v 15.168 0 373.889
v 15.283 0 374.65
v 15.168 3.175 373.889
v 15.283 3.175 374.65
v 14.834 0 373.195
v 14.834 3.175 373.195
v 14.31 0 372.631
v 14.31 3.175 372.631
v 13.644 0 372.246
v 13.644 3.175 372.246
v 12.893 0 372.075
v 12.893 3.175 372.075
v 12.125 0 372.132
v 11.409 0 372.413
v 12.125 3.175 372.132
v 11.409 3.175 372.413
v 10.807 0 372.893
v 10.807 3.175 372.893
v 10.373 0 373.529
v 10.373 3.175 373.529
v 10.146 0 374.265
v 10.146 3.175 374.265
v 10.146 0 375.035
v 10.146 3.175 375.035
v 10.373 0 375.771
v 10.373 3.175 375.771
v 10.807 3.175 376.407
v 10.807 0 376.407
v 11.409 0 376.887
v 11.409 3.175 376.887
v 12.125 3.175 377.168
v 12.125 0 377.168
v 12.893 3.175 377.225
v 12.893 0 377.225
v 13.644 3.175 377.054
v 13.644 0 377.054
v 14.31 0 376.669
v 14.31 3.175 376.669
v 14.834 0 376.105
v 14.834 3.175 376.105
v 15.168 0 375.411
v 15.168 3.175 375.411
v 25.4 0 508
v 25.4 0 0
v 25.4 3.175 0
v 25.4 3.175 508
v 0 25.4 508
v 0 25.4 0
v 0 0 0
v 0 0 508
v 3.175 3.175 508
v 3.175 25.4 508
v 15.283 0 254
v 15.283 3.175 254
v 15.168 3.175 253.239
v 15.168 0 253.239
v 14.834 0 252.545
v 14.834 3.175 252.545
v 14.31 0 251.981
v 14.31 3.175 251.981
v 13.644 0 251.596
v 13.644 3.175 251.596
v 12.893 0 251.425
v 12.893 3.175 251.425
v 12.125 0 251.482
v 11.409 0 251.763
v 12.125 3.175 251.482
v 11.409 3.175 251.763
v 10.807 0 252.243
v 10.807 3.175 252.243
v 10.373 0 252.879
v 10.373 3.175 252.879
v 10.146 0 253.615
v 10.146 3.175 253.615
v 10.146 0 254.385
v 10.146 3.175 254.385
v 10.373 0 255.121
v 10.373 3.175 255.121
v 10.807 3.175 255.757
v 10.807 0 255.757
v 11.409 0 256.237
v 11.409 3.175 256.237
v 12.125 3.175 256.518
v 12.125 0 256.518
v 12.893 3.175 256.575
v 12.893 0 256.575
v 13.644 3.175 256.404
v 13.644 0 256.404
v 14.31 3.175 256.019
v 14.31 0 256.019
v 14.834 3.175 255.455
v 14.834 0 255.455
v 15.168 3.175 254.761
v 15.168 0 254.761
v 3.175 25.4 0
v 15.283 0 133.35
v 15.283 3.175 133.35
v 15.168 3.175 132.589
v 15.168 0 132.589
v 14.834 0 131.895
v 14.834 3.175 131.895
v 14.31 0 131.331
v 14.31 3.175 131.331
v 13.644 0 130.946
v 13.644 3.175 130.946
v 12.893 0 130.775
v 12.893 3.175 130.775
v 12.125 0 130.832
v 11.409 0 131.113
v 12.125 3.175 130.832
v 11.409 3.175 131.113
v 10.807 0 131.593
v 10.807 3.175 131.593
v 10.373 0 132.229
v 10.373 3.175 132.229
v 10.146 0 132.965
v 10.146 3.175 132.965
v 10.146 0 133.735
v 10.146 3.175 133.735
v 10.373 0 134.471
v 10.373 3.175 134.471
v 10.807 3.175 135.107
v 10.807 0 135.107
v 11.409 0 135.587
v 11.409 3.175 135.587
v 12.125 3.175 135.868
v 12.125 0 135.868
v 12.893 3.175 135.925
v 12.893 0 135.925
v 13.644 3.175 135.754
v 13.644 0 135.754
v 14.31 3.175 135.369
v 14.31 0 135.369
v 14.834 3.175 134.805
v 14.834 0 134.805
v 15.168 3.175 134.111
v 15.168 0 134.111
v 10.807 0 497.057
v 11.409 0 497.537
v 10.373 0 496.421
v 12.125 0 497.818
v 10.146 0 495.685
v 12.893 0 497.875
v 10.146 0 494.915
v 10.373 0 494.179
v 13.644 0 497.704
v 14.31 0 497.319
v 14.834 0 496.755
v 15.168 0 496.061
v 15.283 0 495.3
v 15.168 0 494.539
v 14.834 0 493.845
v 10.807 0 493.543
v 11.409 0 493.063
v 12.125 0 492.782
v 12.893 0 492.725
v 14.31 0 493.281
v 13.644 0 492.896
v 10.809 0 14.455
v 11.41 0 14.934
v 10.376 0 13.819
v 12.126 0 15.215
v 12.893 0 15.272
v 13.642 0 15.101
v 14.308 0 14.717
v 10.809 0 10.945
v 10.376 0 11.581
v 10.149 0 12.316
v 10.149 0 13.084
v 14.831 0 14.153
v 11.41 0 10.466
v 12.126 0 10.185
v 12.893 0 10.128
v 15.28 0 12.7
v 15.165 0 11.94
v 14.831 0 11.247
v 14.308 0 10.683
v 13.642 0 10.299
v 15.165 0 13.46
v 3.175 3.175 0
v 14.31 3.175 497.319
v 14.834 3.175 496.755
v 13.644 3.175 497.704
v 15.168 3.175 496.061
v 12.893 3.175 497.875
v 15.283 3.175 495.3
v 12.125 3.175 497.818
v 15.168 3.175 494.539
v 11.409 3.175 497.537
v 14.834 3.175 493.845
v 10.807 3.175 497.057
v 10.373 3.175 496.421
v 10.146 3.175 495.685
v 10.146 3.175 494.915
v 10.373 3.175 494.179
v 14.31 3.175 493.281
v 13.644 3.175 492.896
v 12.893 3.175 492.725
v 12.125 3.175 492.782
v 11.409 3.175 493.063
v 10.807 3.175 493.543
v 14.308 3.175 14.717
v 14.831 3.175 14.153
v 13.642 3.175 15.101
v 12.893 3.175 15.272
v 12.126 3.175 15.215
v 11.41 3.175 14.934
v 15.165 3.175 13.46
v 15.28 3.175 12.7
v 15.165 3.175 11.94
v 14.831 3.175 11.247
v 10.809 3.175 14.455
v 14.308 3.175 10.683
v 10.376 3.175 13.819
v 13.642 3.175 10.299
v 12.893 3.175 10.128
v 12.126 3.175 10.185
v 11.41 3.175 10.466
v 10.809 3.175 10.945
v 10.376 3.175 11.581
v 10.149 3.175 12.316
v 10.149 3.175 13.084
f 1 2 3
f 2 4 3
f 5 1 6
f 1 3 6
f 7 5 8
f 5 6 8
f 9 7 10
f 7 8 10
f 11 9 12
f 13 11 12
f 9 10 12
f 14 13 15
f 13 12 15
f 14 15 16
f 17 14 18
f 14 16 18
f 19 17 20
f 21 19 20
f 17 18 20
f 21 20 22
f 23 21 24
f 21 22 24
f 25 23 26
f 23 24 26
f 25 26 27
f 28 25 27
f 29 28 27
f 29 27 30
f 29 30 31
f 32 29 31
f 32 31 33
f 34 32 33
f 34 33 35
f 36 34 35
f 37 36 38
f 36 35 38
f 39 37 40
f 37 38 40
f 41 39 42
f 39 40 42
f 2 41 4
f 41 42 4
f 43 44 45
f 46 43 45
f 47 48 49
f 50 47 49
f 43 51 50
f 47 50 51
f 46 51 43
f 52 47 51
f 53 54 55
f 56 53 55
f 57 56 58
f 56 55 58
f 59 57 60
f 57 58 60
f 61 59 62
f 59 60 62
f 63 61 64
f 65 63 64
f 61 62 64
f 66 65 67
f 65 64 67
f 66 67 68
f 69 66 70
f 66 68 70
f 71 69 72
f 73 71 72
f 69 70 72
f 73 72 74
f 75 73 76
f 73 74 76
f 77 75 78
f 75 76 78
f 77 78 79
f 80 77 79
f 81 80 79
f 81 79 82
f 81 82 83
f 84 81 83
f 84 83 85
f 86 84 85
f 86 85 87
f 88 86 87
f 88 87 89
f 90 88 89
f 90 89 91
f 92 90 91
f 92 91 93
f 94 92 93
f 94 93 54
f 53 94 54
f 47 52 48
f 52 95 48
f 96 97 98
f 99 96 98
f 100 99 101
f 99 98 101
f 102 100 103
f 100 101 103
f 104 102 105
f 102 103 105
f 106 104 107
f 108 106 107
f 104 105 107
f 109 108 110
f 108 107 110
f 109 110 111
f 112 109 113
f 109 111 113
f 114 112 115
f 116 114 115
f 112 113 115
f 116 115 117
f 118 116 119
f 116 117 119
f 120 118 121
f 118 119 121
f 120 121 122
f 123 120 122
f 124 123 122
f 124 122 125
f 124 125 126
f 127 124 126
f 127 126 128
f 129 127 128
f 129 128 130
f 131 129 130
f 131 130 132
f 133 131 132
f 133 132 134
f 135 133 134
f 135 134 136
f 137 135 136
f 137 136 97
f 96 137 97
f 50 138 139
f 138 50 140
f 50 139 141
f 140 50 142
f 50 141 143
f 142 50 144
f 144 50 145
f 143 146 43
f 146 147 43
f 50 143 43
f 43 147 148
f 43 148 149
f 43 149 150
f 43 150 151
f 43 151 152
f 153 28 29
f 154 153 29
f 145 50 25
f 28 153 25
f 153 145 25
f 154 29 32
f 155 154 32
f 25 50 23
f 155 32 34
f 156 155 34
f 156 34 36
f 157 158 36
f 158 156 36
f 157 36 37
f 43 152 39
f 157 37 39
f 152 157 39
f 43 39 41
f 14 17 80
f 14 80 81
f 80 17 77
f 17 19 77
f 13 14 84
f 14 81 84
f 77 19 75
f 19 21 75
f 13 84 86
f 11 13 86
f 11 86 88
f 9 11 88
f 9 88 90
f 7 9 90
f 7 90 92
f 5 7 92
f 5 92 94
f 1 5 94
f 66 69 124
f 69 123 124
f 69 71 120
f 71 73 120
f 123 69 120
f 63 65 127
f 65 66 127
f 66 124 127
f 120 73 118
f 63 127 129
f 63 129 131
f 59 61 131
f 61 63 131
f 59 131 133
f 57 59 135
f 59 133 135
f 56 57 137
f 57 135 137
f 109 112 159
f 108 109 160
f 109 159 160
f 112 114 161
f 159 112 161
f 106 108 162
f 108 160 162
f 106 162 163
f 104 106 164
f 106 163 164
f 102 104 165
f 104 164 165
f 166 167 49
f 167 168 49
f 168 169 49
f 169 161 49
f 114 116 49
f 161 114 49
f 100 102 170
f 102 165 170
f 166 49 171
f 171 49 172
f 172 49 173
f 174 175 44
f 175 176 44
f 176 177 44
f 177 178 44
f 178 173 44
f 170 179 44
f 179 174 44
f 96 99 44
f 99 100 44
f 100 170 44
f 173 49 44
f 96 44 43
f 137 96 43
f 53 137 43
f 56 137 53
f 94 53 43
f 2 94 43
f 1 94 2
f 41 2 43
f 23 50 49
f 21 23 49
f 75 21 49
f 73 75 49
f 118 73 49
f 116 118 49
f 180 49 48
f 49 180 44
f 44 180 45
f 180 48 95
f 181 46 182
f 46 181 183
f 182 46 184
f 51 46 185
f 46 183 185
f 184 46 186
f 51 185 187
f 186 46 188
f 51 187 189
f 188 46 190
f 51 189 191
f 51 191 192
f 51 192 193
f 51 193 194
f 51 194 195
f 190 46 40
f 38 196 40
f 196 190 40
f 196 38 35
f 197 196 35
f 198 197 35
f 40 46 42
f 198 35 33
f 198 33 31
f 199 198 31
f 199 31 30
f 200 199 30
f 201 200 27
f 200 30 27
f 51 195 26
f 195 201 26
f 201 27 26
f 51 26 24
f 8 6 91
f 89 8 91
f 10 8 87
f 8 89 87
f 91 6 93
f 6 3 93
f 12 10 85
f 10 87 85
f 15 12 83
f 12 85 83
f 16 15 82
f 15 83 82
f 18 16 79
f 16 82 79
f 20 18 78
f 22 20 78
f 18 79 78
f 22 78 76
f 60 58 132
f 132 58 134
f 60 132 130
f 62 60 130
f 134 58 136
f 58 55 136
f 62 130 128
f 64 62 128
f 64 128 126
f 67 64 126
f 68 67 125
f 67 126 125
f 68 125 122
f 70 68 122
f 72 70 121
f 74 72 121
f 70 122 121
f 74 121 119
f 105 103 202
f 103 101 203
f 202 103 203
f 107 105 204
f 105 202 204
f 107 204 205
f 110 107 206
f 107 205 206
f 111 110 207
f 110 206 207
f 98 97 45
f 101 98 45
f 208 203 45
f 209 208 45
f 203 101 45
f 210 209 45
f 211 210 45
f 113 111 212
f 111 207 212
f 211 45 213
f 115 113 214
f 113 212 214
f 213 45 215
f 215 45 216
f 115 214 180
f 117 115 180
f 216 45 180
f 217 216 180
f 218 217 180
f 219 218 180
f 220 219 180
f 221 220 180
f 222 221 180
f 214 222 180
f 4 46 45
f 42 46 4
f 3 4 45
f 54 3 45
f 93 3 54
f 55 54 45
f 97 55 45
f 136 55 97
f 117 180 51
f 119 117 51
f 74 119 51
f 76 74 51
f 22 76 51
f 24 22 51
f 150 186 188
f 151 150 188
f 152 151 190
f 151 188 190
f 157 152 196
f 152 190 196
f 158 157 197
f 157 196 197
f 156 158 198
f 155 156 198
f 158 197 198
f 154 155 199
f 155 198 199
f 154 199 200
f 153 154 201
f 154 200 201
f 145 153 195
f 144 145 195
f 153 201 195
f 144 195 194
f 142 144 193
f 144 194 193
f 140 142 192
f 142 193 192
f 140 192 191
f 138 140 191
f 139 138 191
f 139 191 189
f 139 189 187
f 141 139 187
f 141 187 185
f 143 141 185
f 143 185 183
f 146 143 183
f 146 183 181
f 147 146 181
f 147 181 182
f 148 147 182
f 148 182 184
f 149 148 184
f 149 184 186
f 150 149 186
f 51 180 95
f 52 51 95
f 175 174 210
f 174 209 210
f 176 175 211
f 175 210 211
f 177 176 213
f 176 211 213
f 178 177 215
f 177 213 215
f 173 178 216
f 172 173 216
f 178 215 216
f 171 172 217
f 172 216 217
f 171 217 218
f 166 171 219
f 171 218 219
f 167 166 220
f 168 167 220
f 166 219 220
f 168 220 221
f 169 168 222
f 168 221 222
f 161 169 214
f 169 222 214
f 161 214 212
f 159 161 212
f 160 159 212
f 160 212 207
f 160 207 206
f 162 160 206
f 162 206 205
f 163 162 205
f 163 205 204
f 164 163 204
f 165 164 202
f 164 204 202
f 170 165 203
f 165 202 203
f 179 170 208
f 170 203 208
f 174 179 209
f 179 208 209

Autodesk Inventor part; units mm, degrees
ref_plane "YZ Plane" through (0, 0, 0) normal (1, 0, 0) x (0, 1, 0)
ref_plane "XZ Plane" through (0, 0, 0) normal (0, 1, 0) x (-1, 0, 0)
ref_plane "XY Plane" through (0, 0, 0) normal (0, 0, 1) x (1, 0, 0)
sketch "Sketch1" plane through (0, 0, 0) normal (0, 0, 1) x (1, 0, 0)
  line L0 (0, 0) -> (3.175, 0)
  line L1 (3.175, 0) -> (3.175, 25.4)
  line L2 (3.175, 25.4) -> (0, 25.4)
  line L3 (0, 25.4) -> (0, 0)
  line L4 (0, 0) -> (25.4, 0)
  line L5 (25.4, 0) -> (25.4, 3.175)
  line L6 (25.4, 3.175) -> (0, 3.175)
  line L7 (0, 3.175) -> (0, 0)
  dimension "d0" = 3.175
  dimension "d1" = 25.4
  dimension "d2" = 25.4
  dimension "d3" = 3.175
extrude "Extrusion1" add sketch "Sketch1" along normal blind 508
sketch "Sketch2" plane through (3.175, 3.175, 0) normal (0, 1, 0) x (1, 0, 0)
  line L0 (-3.175, 0) -> (9.525, 0) construction
  line L1 (22.225, 0) -> (0, 0) construction
  line L2 (9.525, 0) -> (9.525, -12.7) construction
  circle A0 centre (9.525, -12.7) radius 2.5797
  line L3 (-3.175, -508) -> (22.225, -508) construction
  line L4 (9.525, -508) -> (9.525, -495.3) construction
  circle A1 centre (9.525, -495.3) radius 2.5826
  line L5 (-3.175, 0) -> (-3.175, -508) construction
  line L6 (-3.175, -254) -> (22.225, -254) construction
  line L7 (22.225, 0) -> (22.225, -508) construction
  line L8 (9.525, -495.3) -> (9.525, -254) construction
  circle A2 centre (9.525, -374.65) radius 2.5826
  circle A3 centre (9.525, -254) radius 2.5826
  line L9 (9.525, -254) -> (9.525, -12.7) construction
  circle A4 centre (9.525, -133.35) radius 2.5826
  dimension "d6" = 12.7
  dimension "d7" = 12.7
  dimension "d16" = 12.7
extrude "Extrusion3" cut sketch "Sketch2" against normal blind 533.4
properties part number "Bumper L"
